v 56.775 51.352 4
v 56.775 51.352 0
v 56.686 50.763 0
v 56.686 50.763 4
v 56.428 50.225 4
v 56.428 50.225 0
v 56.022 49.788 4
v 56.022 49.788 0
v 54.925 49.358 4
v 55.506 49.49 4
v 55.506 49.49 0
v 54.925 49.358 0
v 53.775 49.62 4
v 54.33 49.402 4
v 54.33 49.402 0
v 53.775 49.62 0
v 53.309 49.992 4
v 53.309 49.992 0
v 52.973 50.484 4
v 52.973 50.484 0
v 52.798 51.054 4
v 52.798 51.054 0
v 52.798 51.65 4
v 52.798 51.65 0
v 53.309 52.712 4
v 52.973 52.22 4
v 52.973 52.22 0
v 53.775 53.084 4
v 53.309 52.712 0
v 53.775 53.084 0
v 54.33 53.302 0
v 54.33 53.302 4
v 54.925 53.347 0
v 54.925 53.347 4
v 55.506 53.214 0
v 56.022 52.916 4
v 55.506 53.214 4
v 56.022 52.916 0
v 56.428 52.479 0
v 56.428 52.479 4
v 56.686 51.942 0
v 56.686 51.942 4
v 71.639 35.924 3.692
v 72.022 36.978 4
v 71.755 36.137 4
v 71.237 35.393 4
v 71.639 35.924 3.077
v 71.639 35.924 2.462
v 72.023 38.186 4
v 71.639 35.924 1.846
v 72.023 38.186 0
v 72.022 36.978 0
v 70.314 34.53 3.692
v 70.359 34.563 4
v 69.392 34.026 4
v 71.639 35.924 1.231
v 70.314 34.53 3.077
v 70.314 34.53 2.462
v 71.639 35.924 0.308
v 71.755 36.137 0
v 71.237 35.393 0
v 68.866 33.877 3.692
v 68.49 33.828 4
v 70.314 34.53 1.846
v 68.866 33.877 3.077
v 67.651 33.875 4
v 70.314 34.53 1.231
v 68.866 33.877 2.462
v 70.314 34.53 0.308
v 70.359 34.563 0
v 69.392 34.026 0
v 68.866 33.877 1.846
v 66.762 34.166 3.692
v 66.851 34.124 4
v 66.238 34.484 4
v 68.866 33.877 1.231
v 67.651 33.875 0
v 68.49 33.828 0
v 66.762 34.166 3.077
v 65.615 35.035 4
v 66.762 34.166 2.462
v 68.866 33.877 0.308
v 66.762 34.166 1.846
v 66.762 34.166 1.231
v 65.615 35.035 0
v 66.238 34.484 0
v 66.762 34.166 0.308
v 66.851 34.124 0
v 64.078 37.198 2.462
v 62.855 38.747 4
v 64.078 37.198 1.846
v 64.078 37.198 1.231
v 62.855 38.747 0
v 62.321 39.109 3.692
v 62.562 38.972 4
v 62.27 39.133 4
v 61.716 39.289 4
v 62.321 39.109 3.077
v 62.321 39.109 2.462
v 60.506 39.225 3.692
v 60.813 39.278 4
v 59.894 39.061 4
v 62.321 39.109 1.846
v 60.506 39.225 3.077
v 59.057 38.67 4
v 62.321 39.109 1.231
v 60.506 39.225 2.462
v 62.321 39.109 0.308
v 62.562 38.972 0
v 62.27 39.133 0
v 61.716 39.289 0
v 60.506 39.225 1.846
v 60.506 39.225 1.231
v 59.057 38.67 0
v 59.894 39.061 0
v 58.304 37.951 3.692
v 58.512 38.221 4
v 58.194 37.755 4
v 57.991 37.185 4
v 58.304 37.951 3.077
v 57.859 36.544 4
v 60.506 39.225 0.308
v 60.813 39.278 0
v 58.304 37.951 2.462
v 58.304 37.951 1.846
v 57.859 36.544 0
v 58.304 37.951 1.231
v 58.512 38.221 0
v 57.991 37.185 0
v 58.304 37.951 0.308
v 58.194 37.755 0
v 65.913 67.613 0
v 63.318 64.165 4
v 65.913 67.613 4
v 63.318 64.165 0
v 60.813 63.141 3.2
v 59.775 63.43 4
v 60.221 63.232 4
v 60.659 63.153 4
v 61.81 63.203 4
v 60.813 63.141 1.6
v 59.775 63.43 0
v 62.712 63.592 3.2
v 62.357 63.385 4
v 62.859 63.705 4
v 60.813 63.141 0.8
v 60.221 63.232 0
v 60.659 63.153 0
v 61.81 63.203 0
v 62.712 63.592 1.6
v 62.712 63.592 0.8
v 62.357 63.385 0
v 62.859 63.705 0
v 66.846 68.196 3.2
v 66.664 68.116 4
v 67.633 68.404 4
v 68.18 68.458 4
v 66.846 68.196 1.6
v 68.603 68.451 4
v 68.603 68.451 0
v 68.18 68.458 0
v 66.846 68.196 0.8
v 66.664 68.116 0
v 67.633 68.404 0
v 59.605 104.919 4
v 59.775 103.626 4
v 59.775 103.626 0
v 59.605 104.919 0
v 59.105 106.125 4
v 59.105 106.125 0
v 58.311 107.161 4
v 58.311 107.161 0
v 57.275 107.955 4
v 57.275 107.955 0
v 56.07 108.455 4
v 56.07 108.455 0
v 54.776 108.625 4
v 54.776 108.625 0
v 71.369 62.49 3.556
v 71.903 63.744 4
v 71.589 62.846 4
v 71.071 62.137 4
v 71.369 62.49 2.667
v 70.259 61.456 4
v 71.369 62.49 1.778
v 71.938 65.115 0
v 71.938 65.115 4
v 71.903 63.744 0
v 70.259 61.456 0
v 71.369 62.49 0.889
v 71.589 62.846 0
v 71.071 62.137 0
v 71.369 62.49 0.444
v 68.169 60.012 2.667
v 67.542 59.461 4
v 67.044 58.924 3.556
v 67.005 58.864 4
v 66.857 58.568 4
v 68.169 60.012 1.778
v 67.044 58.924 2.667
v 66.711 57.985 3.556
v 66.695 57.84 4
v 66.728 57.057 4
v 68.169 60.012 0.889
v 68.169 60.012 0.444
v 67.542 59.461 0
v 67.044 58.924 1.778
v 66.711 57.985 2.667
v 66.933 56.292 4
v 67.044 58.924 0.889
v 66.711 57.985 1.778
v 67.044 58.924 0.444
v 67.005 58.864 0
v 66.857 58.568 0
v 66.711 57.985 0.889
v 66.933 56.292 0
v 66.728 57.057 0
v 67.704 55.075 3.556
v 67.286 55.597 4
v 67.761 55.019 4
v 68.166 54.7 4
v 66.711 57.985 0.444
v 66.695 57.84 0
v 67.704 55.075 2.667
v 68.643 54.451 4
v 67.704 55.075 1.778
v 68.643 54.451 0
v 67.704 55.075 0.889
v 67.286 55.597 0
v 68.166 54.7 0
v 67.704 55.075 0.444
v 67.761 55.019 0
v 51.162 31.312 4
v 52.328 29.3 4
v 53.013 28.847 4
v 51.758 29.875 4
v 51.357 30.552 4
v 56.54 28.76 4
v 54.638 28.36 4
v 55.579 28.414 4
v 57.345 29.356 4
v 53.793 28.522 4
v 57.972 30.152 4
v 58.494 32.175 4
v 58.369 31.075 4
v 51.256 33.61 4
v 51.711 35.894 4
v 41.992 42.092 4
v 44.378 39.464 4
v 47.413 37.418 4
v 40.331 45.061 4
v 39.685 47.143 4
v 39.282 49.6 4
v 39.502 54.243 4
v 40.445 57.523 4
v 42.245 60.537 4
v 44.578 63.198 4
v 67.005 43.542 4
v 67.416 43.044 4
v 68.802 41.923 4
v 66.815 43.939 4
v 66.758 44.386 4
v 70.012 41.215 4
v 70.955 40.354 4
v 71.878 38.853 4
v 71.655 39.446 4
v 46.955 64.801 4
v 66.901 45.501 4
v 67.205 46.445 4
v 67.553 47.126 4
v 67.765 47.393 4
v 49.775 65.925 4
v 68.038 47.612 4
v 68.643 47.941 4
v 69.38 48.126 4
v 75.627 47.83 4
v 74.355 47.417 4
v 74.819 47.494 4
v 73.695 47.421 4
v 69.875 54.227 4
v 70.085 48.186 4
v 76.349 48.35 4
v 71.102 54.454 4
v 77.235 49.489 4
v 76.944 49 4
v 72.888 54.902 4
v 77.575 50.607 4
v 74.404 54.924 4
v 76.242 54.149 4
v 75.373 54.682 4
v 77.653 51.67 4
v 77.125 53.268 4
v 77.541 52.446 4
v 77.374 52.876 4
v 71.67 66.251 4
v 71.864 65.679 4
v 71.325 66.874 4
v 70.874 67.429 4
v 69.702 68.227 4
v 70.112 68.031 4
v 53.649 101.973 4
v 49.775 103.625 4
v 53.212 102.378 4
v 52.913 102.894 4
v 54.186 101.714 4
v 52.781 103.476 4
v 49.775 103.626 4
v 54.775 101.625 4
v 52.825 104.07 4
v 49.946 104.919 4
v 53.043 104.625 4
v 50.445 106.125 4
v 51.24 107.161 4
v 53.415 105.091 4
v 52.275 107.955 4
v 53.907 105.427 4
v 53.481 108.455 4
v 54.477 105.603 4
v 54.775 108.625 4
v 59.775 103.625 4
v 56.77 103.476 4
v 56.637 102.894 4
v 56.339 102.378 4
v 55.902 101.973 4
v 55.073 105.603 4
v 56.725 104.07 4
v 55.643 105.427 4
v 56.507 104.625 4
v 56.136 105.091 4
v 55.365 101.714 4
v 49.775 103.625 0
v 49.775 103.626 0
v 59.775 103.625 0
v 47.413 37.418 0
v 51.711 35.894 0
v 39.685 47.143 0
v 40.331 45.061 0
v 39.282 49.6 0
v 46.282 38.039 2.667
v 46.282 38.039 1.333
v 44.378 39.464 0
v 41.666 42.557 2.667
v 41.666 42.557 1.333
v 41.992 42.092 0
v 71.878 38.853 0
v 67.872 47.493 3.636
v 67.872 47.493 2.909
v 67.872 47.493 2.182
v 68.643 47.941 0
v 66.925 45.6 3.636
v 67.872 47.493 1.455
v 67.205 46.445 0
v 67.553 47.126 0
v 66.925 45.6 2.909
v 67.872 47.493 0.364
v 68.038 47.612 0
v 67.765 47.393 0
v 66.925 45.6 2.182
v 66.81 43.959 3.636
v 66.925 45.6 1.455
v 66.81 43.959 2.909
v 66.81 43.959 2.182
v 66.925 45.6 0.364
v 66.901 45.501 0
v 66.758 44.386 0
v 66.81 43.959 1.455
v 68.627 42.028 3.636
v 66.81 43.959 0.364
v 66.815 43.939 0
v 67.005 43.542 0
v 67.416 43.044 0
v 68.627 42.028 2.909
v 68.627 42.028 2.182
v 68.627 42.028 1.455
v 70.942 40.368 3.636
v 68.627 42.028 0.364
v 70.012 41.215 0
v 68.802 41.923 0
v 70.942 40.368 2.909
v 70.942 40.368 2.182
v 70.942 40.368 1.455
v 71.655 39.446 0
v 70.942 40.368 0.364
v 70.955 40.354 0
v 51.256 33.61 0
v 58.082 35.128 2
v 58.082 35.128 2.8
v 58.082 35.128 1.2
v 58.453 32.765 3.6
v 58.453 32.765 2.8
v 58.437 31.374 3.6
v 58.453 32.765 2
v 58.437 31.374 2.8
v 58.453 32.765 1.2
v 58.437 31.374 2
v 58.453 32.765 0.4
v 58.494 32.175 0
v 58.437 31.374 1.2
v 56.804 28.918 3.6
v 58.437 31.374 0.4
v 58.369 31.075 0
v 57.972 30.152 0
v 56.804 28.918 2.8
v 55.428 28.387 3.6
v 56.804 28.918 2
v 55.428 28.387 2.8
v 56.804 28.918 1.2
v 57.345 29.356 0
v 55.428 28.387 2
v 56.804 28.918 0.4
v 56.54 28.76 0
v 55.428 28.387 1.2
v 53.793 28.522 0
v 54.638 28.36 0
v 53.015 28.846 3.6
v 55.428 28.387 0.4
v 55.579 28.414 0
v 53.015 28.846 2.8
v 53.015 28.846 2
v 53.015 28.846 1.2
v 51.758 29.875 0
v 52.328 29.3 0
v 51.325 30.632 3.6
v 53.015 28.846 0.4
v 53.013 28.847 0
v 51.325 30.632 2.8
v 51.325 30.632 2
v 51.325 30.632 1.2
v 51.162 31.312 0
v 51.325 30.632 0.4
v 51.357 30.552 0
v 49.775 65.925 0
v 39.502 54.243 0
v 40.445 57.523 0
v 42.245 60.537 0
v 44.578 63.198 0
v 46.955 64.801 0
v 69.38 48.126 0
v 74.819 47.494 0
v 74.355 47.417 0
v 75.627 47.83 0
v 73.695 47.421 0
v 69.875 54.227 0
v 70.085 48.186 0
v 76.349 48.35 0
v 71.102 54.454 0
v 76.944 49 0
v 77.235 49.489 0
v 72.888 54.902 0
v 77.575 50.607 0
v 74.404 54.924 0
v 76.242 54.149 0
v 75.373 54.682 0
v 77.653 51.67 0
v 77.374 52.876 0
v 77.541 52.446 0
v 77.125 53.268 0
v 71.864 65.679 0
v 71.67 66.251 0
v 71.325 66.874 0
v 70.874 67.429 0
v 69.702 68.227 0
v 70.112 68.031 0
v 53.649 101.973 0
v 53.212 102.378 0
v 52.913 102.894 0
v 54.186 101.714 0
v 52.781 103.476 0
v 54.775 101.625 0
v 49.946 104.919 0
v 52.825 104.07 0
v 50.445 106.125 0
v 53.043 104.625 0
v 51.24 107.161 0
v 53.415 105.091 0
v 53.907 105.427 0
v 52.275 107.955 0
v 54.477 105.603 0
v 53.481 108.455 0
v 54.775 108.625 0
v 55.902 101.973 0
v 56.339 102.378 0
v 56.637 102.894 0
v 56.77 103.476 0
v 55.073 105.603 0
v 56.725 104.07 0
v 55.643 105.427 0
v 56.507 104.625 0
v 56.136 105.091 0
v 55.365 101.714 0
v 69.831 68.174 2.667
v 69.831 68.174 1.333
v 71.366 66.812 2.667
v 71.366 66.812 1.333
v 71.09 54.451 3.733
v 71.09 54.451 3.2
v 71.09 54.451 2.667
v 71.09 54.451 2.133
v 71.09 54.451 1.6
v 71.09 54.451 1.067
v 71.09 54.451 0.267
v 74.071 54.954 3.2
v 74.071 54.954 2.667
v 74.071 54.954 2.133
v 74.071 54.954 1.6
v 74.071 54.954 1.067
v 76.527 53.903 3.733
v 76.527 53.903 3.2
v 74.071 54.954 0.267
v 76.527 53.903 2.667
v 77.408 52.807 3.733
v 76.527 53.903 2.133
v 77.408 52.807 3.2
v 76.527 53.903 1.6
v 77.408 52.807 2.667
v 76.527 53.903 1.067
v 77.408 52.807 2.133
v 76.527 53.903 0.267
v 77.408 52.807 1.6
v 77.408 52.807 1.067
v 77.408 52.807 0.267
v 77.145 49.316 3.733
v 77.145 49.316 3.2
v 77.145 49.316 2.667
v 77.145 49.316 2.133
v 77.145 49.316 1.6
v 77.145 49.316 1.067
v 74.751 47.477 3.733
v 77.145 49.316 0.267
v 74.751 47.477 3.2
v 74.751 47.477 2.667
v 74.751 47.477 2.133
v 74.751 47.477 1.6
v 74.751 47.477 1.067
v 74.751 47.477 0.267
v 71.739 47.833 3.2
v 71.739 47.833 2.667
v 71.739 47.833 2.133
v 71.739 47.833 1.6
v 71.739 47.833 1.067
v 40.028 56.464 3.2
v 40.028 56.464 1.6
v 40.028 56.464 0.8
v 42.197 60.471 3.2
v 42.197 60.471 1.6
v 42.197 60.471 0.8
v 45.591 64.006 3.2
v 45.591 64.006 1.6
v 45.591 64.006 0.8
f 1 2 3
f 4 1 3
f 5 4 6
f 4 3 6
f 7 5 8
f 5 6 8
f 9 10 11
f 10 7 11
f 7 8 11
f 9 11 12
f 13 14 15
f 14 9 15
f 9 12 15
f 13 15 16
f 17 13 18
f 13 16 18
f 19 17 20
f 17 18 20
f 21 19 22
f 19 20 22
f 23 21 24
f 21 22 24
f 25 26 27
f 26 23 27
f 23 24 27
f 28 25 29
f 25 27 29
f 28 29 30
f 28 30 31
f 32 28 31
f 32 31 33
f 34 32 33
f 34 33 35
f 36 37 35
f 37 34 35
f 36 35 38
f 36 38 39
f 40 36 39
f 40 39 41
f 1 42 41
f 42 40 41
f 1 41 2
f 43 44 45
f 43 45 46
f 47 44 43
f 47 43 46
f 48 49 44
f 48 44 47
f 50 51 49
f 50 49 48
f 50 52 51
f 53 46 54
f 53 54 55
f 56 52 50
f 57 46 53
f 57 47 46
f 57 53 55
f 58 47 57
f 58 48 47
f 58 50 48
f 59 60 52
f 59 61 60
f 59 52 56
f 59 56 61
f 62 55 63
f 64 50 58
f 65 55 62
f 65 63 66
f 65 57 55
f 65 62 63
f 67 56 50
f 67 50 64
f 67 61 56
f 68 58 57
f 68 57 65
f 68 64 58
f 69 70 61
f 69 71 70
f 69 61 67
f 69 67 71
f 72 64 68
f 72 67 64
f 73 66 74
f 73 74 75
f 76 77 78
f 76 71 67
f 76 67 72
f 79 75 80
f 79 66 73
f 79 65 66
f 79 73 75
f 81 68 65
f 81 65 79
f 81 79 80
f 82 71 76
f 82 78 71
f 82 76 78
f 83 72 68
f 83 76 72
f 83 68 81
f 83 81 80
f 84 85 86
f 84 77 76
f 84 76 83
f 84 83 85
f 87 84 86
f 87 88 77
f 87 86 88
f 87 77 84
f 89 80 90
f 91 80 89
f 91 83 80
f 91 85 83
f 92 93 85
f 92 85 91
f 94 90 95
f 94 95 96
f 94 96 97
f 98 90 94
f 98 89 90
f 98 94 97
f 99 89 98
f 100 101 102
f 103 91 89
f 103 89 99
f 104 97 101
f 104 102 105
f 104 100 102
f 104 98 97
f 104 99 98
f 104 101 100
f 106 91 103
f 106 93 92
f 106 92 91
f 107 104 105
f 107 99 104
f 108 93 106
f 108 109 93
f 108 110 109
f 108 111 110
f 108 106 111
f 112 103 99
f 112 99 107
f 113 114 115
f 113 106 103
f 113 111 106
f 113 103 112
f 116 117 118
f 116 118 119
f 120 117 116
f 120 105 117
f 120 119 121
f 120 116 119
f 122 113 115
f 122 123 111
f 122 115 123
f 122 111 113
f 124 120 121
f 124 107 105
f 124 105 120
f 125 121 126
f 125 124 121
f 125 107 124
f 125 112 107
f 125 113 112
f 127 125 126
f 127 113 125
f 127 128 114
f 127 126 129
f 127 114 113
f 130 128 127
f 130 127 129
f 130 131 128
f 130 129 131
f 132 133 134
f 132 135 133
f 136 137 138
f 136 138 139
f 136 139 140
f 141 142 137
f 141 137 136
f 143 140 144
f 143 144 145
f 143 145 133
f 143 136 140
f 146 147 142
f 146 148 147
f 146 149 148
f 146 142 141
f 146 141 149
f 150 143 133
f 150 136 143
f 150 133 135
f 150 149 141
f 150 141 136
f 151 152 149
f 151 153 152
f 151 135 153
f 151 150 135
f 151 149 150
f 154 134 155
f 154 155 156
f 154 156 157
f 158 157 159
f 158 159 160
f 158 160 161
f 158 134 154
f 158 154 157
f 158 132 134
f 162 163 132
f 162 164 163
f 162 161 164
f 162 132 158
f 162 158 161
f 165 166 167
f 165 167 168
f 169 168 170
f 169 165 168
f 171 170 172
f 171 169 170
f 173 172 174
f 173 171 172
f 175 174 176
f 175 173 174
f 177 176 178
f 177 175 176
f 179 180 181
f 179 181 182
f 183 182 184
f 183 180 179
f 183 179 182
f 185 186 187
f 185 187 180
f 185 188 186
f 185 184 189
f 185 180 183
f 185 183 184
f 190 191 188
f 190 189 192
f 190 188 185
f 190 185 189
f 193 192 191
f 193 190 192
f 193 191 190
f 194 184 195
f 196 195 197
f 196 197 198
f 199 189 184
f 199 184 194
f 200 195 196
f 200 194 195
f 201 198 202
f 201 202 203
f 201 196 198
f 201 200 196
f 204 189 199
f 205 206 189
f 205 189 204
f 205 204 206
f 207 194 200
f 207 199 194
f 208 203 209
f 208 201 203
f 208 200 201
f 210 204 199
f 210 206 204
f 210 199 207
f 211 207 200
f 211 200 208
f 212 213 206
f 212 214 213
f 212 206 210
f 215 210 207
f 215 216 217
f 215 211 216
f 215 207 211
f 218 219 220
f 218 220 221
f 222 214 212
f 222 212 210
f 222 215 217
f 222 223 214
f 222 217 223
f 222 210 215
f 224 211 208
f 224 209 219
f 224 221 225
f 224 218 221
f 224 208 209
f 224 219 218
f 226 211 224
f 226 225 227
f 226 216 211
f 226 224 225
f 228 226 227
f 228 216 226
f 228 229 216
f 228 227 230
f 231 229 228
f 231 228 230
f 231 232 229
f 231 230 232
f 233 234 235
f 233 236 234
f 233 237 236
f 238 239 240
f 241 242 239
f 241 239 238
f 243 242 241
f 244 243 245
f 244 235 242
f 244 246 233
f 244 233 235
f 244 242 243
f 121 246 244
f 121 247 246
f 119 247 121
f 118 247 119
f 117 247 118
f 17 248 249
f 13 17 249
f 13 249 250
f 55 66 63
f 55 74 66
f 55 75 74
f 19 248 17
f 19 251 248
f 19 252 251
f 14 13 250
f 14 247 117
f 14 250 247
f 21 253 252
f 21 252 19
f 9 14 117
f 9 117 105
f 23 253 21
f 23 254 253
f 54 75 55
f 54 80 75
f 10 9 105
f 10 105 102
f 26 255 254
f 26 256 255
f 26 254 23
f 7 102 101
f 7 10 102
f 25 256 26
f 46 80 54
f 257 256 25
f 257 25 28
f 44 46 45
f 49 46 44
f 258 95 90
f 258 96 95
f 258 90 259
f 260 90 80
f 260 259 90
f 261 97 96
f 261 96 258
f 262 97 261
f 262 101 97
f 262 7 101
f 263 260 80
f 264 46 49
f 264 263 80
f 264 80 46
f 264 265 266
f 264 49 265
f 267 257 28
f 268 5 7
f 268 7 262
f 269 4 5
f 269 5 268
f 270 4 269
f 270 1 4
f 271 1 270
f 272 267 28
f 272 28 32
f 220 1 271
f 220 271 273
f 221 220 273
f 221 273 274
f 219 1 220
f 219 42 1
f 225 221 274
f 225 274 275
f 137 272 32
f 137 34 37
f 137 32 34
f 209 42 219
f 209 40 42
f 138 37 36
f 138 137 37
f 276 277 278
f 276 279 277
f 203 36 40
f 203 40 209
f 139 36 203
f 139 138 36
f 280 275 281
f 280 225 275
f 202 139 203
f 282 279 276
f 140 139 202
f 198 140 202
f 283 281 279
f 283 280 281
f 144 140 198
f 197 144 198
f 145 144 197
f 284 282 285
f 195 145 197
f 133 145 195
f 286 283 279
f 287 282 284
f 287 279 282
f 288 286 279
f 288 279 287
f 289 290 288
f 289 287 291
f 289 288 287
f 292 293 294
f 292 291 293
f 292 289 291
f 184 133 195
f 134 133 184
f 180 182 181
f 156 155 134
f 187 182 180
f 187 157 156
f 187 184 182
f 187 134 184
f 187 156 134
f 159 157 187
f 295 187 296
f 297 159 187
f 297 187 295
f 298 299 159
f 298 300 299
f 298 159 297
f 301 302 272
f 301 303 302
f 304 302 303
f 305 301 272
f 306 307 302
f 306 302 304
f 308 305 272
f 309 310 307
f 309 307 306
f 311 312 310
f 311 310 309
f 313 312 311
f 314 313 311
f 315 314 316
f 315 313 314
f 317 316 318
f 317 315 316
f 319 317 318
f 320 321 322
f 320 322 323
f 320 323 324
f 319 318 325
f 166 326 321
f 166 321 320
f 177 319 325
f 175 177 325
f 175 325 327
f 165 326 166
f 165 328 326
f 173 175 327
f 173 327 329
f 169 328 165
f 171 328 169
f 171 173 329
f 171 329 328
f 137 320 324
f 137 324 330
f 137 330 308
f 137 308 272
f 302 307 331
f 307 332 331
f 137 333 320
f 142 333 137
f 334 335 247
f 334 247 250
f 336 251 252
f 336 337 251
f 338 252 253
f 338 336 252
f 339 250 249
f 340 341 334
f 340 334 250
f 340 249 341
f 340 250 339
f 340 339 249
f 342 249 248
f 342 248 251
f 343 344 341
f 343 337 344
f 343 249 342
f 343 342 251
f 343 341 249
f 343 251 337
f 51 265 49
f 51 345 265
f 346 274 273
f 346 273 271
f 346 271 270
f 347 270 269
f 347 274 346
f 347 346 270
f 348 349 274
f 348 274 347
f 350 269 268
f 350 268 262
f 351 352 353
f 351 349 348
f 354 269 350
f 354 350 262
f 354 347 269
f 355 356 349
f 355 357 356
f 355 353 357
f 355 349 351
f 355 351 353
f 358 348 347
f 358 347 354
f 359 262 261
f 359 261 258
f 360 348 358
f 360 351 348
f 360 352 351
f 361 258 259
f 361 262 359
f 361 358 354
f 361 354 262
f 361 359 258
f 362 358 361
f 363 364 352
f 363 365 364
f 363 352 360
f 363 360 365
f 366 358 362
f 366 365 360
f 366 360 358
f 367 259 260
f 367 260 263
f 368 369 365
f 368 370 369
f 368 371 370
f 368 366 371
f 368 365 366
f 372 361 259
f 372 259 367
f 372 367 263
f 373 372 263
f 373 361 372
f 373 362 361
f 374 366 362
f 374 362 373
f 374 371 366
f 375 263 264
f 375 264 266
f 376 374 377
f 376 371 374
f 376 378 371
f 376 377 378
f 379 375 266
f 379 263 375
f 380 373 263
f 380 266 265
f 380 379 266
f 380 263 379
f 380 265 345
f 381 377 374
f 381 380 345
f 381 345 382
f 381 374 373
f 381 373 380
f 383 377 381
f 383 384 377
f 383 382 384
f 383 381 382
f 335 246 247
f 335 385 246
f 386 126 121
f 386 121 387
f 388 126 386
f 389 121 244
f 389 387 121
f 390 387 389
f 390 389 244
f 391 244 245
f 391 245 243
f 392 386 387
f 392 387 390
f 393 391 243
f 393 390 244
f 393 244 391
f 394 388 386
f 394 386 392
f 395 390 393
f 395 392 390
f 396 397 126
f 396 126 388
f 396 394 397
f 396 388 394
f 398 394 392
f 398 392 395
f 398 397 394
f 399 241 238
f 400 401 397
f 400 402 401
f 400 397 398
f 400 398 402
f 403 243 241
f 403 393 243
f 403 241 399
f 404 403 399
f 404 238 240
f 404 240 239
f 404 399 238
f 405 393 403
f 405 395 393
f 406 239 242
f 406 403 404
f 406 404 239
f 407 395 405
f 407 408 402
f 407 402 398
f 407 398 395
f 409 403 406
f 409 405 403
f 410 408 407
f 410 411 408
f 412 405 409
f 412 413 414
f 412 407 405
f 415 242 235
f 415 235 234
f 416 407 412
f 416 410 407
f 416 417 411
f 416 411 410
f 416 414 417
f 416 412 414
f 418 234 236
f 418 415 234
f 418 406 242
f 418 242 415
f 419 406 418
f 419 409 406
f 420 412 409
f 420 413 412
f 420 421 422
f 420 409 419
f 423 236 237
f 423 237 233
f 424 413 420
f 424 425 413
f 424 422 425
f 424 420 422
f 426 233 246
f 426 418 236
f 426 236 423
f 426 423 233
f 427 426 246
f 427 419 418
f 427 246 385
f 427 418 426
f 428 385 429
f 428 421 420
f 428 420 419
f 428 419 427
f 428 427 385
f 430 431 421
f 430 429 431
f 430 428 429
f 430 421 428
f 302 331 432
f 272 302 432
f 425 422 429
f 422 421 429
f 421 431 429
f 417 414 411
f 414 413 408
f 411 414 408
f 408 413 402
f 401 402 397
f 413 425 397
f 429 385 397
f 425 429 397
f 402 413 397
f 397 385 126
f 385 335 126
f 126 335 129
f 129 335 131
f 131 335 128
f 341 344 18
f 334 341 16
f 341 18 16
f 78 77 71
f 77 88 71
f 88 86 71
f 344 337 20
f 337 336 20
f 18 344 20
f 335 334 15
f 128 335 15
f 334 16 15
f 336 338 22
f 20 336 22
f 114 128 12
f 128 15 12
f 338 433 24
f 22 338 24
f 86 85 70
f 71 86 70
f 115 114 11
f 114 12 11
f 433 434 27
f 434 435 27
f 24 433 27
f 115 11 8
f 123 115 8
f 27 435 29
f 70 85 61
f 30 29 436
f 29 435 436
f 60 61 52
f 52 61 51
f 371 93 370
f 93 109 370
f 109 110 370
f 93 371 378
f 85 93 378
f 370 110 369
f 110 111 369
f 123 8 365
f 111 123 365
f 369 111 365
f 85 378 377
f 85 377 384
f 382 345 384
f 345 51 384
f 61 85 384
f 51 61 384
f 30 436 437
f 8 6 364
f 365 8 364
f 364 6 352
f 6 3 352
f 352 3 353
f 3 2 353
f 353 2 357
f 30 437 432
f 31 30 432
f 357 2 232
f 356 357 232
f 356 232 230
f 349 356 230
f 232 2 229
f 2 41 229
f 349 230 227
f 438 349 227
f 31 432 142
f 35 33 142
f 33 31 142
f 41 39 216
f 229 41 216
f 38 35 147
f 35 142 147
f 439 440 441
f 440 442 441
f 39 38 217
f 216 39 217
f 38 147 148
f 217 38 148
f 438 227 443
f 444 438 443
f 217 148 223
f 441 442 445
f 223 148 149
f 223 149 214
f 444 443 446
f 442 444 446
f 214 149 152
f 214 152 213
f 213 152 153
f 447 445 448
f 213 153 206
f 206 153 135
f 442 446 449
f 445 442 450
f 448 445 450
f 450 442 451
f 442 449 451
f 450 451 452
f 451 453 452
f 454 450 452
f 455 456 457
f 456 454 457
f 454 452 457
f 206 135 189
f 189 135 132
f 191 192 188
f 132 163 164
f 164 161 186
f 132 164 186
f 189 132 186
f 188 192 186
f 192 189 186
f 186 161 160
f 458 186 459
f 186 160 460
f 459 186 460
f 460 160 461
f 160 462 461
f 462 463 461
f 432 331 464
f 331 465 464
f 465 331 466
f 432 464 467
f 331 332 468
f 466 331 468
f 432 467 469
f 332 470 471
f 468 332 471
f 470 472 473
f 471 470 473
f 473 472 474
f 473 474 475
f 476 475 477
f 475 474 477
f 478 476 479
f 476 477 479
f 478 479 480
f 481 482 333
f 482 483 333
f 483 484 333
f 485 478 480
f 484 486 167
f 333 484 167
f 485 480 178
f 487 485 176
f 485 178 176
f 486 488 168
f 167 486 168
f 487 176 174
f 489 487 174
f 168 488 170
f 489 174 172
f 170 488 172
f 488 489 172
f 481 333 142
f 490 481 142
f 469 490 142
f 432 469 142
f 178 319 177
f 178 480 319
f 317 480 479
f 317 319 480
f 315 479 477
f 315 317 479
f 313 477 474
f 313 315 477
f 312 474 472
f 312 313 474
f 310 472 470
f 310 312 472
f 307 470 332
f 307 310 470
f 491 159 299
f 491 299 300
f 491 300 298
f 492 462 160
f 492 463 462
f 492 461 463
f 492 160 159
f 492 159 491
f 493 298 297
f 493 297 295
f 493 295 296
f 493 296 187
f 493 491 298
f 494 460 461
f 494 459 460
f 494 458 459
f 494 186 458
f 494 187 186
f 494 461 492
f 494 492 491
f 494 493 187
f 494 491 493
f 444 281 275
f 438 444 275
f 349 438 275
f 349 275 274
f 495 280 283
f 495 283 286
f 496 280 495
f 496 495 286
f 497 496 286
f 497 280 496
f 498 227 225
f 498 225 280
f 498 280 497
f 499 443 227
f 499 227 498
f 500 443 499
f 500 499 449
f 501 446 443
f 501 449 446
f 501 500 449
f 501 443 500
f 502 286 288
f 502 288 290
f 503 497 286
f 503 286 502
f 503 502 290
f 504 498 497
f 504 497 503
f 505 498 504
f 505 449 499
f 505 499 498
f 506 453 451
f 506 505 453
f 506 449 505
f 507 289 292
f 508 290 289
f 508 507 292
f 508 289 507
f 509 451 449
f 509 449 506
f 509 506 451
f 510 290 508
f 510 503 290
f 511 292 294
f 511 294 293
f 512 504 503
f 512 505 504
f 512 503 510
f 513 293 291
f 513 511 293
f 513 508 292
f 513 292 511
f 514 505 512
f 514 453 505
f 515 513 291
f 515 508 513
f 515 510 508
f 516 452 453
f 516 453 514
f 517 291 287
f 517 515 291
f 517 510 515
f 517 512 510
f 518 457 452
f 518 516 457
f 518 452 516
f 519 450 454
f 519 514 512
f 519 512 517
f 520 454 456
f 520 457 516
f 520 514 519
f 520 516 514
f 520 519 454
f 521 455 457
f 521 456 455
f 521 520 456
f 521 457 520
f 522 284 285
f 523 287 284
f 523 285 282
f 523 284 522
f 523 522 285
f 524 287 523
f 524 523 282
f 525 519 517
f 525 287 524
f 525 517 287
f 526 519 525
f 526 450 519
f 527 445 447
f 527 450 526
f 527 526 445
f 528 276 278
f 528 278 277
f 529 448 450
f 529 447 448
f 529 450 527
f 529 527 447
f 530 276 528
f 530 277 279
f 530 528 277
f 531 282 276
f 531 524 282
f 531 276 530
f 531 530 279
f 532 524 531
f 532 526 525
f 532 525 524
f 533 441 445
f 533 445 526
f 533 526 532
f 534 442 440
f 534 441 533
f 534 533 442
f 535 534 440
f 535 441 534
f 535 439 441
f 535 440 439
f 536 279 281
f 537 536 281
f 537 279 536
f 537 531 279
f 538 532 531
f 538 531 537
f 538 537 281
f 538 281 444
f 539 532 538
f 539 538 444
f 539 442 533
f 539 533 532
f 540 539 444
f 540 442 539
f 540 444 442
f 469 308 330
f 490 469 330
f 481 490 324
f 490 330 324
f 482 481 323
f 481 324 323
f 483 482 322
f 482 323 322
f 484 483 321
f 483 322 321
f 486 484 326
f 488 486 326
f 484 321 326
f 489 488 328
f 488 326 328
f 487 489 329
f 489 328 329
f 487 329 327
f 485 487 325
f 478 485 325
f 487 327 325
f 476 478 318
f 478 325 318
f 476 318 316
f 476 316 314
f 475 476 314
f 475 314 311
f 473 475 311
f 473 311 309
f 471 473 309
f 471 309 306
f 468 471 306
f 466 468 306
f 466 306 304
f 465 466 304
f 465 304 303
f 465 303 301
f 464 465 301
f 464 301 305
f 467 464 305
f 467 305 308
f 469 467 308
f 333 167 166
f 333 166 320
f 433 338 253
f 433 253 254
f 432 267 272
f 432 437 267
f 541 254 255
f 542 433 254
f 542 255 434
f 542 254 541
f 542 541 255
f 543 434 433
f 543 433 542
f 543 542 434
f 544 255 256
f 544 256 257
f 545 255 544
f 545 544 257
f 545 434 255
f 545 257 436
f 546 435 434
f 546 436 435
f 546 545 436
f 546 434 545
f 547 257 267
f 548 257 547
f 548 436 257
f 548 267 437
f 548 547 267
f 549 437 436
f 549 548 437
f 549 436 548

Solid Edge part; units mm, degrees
sketch "Sketch1" plane through (0, 0, 0) normal (0, 0, 1) x (1, 0, 0)
  line L0 (54.7752, 108.625) -> (49.7752, 108.625)
  line L1 (49.7752, 108.625) -> (49.7752, 103.625)
  line L2 (49.7752, 103.625) -> (49.7752, 65.925)
  spline S0 degree 3 poles (39.2824, 49.6002) (39.2622, 50.4053) (39.2478, 52.5573) (39.7071, 56.5503) (42.1276, 60.625) (45.3473, 64.3107) (48.1834, 65.3638) (49.7752, 65.925) knots 0 0 0 0 0.104683 0.32992 0.547052 0.780624 1 1 1 1
  spline S1 degree 3 poles (51.7113, 35.8937) (49.6537, 36.4836) (45.9727, 37.6472) (41.026, 42.6445) (39.6069, 46.5694) (39.2824, 49.6002) knots 0 0 0 0 0.300098 0.63173 1 1 1 1
  spline S2 degree 3 poles (57.859, 36.5445) (57.9403, 36.0251) (58.0706, 35.2024) (58.2713, 33.9183) (58.4916, 32.6839) (58.5537, 30.8374) (57.3293, 29.0058) (55.1292, 28.1578) (52.9142, 28.6237) (51.0705, 30.3888) (51.1297, 33.1464) (51.4158, 34.7273) (51.7113, 35.8937) knots 0 0 0 0 0.072157 0.135927 0.192544 0.262509 0.410928 0.485136 0.608767 0.732488 0.834866 1 1 1 1
  spline S3 degree 3 poles (72.023, 38.1858) (72.0627, 37.7462) (72.1053, 37.0177) (71.7442, 35.9908) (71.0918, 35.2061) (70.2427, 34.3898) (68.7324, 33.6588) (66.6627, 33.9594) (65.128, 35.4588) (64.1822, 37.0633) (63.3265, 38.3437) (62.1777, 39.3741) (60.2434, 39.3397) (58.2277, 38.3873) (57.9522, 37.0773) (57.859, 36.5445) knots 0 0 0 0 0.058682 0.113545 0.151332 0.207609 0.28503 0.388593 0.489359 0.587777 0.661201 0.715443 0.8041 0.928088 1 1 1 1
  spline S4 degree 3 poles (68.643, 47.9408) (68.3361, 47.764) (67.7662, 47.545) (67.2461, 46.6197) (66.9123, 45.6619) (66.7563, 44.7564) (66.7415, 43.8003) (67.5227, 42.8875) (68.5527, 41.9844) (69.9302, 41.3759) (70.8858, 40.4495) (71.7725, 39.4514) (71.9304, 38.6721) (72.023, 38.1858) knots 0 0 0 0 0.066734 0.148003 0.235363 0.309624 0.366171 0.454208 0.577851 0.693897 0.804155 0.893296 1 1 1 1
  spline S5 degree 3 poles (68.643, 54.4507) (69.1, 54.3256) (69.8686, 54.1227) (71.1831, 54.4638) (72.5145, 54.8959) (74.0227, 55.0271) (75.4825, 54.7529) (76.5843, 53.9029) (77.6468, 52.7547) (77.7129, 50.9913) (77.2888, 49.2676) (76.1459, 48.0728) (74.5836, 47.2528) (73.0247, 47.4852) (71.4705, 47.8982) (70.073, 48.3384) (69.1011, 48.0679) (68.643, 47.9408) knots 0 0 0 0 0.057438 0.11055 0.174603 0.245534 0.310323 0.366514 0.429026 0.511292 0.587777 0.661164 0.724422 0.815863 0.859826 0.942366 1 1 1 1
  spline S6 degree 3 poles (71.9379, 65.1149) (71.9858, 64.5983) (71.9872, 63.715) (71.4707, 62.4605) (70.1059, 61.2469) (68.6567, 60.4737) (67.5754, 59.4933) (66.9381, 58.9019) (66.4348, 57.3131) (67.164, 55.3472) (68.2694, 54.6066) (68.643, 54.4507) knots 0 0 0 0 0.096984 0.197924 0.289703 0.498192 0.557698 0.613885 0.687505 0.914642 1 1 1 1
  spline S7 degree 3 poles (68.6026, 68.4506) (68.9895, 68.415) (70.0292, 68.2687) (71.4661, 66.9697) (71.9309, 65.6689) (71.9379, 65.1149) knots 0 0 0 0 0.271145 0.657811 1 1 1 1
  spline S8 degree 3 poles (59.7752, 63.4298) (60.1278, 63.2105) (61.2234, 63.0533) (63.0006, 63.3365) (64.5021, 66.0107) (66.3421, 68.39) (68.2314, 68.4842) (68.6026, 68.4506) knots 0 0 0 0 0.099116 0.309823 0.586006 0.83442 1 1 1 1
  line L3 (59.7752, 103.625) -> (59.7752, 63.4298)
  line L4 (59.7752, 108.625) -> (59.7752, 103.625)
  line L5 (54.7752, 108.625) -> (59.7752, 108.625)
  circle A0 centre (54.7752, 51.3521) radius 2
extrude "Protrusion1" add sketch "Sketch1" along normal blind 4
hole "Furo_1" at (54.7752, 103.625, 4) direction (0, 0, -1) diameter 4 end up to next
fillet "Redondo_1" radius 5 2 edges at (59.7752, 108.625, 2) (49.7752, 108.625, 2)
